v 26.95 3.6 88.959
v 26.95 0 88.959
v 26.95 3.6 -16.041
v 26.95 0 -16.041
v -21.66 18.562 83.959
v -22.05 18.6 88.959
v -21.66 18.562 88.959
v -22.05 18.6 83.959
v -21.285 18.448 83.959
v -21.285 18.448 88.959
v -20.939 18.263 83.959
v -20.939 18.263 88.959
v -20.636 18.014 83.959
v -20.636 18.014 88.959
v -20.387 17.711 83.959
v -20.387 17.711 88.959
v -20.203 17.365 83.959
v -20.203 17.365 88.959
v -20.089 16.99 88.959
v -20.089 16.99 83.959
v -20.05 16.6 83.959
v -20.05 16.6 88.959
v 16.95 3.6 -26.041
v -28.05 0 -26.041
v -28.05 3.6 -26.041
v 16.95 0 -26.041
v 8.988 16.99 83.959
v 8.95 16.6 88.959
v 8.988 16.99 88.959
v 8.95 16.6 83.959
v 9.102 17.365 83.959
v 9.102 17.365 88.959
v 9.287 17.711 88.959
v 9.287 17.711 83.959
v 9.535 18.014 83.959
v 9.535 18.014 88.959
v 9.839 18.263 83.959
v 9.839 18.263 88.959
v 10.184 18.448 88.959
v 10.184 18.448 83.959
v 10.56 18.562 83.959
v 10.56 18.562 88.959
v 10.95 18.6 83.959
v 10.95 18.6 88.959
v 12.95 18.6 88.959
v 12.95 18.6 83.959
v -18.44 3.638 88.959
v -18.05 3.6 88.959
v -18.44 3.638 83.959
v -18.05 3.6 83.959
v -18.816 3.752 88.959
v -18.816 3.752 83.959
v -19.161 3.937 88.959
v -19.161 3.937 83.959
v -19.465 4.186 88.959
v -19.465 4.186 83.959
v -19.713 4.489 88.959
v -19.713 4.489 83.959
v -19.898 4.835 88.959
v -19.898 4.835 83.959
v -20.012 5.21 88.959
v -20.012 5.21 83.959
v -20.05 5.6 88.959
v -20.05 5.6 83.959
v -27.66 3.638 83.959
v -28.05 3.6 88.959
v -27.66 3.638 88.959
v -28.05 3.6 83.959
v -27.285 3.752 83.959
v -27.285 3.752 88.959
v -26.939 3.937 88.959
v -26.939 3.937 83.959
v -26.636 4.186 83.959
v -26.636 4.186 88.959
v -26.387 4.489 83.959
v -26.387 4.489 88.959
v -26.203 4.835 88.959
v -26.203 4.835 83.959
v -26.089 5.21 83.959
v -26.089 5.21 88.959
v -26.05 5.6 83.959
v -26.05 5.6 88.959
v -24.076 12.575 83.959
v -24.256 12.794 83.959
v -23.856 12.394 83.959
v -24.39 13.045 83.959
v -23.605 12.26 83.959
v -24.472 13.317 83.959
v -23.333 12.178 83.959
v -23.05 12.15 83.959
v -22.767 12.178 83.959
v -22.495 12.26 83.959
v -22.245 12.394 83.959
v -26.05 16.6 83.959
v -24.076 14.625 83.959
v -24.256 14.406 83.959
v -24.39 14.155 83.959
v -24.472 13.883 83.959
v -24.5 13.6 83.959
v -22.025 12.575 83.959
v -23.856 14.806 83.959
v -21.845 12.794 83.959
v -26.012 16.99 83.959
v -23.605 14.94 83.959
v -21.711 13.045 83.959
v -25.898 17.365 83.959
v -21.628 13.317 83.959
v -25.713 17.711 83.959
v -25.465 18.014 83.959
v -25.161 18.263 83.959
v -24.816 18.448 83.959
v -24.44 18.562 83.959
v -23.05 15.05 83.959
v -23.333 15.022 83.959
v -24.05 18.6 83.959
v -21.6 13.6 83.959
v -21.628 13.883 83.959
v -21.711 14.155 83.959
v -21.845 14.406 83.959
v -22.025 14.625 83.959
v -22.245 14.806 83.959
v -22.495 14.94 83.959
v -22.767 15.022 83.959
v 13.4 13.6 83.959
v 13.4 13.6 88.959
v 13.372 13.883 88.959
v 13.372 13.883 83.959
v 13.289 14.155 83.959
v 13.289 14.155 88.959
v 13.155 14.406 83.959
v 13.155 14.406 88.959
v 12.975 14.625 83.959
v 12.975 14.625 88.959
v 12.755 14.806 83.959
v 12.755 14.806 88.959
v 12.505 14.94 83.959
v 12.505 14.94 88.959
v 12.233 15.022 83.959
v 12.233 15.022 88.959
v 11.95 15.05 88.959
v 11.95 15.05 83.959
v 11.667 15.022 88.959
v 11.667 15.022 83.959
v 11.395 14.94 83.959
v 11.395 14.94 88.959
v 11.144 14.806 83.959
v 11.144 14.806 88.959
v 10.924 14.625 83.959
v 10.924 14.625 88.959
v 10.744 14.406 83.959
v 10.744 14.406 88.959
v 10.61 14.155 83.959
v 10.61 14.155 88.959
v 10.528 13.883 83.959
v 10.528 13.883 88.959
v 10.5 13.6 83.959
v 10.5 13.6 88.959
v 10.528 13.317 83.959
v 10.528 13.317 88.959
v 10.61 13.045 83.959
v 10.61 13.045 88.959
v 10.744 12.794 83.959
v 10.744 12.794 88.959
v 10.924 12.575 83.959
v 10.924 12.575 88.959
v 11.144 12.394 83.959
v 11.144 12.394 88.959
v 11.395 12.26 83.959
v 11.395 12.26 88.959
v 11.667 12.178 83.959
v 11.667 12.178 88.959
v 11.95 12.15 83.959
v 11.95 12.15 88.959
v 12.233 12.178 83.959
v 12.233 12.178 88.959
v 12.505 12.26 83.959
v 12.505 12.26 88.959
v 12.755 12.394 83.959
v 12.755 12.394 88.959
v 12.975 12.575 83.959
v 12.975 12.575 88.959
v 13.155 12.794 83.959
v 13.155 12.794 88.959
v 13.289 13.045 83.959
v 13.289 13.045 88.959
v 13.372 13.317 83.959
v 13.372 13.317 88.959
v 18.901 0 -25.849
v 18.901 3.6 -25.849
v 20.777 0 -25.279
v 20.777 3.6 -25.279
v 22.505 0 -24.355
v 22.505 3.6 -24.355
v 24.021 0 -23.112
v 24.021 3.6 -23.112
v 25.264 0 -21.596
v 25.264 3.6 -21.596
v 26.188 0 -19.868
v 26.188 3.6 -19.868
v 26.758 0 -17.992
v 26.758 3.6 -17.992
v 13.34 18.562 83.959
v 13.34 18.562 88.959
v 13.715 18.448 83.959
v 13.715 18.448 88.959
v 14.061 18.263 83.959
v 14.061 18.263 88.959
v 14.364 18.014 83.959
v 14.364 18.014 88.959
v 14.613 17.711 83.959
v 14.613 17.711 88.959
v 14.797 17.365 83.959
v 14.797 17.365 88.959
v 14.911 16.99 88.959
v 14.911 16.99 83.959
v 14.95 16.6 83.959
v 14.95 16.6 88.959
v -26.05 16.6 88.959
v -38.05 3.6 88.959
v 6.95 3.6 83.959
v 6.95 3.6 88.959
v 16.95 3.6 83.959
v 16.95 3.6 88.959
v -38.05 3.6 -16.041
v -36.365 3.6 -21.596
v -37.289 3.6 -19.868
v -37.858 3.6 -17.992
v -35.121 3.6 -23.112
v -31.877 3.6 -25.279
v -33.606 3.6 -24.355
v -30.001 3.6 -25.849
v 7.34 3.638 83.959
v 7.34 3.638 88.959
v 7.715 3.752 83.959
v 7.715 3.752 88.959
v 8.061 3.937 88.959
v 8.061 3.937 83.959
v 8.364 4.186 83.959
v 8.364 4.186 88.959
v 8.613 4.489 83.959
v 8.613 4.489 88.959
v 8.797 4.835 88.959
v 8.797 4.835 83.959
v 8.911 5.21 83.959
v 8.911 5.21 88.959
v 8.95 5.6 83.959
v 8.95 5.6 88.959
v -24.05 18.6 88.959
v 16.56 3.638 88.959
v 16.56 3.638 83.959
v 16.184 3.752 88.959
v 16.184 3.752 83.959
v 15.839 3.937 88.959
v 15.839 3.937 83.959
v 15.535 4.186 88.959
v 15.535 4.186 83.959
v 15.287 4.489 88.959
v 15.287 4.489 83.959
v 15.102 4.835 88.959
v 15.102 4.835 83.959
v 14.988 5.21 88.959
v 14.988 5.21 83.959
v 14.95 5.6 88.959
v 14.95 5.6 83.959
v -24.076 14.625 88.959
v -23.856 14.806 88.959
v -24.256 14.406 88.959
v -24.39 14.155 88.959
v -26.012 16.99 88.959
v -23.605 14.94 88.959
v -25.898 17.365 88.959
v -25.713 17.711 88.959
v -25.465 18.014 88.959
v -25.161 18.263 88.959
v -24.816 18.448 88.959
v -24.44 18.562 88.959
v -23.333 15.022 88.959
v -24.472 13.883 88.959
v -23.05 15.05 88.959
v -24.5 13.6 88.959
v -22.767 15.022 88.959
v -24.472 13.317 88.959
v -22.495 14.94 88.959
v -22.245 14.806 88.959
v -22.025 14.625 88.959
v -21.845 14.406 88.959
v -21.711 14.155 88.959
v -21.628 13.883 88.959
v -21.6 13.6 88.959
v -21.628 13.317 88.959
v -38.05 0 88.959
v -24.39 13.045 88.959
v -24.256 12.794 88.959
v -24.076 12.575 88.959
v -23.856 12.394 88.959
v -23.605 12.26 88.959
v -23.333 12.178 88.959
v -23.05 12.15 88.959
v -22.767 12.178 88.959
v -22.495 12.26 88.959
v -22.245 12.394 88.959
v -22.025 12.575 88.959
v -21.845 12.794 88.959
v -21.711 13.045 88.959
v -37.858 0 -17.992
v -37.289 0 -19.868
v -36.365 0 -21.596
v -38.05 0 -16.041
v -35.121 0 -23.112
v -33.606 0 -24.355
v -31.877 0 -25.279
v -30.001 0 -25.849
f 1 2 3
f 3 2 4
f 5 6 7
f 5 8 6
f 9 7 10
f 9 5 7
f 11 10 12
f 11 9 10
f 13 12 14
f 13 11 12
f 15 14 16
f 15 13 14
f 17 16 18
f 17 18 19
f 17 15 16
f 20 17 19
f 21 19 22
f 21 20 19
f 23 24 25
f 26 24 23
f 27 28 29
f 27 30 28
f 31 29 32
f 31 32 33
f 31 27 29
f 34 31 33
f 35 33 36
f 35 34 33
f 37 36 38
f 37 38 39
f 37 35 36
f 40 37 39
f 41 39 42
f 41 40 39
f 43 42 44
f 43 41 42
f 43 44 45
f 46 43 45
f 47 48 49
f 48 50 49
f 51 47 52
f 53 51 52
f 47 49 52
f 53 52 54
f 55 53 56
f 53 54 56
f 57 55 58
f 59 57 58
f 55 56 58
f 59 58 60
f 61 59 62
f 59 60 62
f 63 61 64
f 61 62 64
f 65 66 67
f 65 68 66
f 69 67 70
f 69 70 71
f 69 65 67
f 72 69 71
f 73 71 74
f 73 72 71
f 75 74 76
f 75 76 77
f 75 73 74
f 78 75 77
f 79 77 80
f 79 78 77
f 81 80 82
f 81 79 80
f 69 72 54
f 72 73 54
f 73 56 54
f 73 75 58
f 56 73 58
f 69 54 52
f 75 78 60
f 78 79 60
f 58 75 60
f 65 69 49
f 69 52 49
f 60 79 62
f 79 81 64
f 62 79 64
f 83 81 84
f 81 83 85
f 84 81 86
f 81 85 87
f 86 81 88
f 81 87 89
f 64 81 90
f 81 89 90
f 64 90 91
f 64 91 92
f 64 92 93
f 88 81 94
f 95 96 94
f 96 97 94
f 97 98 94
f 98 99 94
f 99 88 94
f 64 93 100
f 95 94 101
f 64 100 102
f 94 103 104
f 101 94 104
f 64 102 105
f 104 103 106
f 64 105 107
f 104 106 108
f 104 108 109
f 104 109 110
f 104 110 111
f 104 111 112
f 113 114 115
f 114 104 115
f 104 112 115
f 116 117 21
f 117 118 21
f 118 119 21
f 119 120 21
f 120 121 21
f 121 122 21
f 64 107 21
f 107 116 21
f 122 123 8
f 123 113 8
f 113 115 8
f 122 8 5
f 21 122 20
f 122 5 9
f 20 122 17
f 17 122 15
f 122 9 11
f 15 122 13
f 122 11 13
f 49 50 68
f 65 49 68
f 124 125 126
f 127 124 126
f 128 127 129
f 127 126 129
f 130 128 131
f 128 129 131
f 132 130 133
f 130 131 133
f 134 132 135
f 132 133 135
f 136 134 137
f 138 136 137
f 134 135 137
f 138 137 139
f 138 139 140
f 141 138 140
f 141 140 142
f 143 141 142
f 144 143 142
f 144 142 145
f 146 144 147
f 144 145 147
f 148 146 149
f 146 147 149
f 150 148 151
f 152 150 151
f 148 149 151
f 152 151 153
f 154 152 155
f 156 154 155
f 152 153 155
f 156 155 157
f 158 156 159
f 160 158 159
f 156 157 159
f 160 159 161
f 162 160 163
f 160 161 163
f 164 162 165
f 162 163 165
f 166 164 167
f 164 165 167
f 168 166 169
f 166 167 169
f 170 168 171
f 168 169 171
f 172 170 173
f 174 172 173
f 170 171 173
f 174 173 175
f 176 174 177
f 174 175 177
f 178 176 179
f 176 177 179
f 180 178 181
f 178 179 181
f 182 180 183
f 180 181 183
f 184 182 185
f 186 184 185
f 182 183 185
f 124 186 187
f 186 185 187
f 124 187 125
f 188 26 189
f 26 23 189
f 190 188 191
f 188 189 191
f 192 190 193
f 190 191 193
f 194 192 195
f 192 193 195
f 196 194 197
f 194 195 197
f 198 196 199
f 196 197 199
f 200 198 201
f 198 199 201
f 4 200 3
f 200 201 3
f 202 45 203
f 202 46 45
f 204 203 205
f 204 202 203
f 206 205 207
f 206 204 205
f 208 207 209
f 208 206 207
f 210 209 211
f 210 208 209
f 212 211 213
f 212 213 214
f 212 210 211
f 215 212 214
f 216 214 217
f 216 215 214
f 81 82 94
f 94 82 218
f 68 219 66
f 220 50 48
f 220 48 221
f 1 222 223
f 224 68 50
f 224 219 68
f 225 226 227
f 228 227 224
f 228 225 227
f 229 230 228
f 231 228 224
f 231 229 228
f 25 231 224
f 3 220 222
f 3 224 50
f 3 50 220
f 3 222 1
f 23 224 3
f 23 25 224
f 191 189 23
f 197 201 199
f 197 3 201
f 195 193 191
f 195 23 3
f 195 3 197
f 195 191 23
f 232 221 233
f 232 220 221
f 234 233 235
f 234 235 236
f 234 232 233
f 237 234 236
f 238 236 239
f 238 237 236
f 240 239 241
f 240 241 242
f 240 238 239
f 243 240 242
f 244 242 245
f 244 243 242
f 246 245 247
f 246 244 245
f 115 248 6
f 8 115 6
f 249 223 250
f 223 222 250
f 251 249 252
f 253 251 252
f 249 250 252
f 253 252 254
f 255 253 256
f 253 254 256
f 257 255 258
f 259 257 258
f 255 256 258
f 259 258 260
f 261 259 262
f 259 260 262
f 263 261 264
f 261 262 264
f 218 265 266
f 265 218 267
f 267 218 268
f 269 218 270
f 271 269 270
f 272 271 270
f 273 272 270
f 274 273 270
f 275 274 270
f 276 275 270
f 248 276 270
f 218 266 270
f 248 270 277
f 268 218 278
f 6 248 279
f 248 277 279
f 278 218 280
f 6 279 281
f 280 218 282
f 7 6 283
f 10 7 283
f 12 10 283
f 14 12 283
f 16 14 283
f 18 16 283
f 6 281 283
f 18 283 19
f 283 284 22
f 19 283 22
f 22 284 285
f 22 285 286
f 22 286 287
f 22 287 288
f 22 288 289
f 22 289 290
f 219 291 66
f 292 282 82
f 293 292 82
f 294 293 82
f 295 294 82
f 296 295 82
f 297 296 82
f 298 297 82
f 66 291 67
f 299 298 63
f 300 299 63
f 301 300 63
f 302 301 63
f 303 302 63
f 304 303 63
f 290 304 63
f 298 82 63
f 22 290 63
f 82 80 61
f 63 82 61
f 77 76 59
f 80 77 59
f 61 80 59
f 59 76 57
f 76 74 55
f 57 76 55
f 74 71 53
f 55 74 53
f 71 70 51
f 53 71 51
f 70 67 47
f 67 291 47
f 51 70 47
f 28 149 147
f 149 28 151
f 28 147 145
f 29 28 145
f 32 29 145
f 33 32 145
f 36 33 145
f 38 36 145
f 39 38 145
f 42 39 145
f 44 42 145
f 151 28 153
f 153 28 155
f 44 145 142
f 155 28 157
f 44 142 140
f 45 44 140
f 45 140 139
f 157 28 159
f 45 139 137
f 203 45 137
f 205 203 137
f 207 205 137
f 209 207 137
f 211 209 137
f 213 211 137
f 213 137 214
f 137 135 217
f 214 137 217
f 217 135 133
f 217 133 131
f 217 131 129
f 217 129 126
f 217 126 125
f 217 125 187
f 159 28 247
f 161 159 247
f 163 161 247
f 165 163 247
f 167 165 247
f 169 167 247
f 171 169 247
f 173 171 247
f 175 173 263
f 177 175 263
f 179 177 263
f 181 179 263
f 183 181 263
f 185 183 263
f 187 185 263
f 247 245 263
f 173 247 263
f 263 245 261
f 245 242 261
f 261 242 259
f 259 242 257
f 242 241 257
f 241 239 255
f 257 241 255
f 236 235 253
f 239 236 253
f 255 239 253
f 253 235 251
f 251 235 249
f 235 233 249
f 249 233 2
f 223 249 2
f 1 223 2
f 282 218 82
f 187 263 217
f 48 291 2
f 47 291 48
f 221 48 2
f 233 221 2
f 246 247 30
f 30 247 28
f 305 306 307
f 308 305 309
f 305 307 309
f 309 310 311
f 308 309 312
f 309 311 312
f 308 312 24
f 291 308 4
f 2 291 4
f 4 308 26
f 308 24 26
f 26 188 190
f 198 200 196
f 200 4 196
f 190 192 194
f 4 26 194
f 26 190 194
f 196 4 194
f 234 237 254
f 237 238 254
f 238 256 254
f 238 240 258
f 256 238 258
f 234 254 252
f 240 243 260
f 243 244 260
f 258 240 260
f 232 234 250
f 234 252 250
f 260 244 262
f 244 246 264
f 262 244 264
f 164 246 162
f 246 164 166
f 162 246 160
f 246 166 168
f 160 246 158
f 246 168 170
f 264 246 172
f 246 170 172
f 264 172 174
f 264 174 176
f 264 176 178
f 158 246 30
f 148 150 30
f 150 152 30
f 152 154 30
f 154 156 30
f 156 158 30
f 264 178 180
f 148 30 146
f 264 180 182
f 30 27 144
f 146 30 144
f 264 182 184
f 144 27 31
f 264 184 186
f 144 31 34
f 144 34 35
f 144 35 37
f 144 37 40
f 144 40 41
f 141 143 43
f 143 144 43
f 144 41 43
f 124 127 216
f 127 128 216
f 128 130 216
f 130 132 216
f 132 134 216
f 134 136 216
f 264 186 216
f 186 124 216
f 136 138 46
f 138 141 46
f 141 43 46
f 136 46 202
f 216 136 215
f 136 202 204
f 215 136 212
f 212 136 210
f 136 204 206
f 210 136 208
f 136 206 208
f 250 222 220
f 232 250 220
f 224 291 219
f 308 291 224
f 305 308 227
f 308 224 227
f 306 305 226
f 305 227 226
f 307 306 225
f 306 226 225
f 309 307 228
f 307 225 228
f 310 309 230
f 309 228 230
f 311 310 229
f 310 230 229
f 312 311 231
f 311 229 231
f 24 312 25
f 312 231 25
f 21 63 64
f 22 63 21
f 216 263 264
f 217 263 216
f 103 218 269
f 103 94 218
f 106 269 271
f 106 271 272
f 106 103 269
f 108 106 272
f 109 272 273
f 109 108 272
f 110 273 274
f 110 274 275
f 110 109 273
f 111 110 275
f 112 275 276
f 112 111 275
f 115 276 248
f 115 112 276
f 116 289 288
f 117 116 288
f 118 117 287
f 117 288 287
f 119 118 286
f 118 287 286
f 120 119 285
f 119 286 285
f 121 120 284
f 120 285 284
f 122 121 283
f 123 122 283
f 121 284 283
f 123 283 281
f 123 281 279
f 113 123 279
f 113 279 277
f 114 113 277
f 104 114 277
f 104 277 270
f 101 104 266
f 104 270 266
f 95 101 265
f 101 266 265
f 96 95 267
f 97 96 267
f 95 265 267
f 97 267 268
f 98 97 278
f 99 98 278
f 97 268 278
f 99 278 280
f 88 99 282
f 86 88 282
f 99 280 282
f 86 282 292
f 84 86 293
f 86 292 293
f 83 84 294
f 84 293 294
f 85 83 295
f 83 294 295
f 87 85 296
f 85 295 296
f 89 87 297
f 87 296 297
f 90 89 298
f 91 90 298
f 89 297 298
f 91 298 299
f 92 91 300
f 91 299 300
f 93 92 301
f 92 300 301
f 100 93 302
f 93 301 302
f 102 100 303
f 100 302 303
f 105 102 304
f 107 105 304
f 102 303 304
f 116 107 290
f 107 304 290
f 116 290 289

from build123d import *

# Parameters (mm, degrees)
SKETCH_1_W      = 65
SKETCH_1_H      = 115
EXTRUDE_1_DEPTH = 3.6
SKETCH_3_W      = 6
SKETCH_3_H      = 15
SKETCH_3_R      = 1.45
EXTRUDE_2_DEPTH = 5
FILLET_1_R      = 10
FILLET_2_R      = 2


with BuildPart() as part:
    # 草图1 → 凸台-拉伸1 (new body)
    with BuildSketch(Plane(origin=(0, 0, 0), x_dir=(1, 0, 0), z_dir=(0, 1, 0))):
        with Locations((-5.550310529, -31.459318732)):
            Rectangle(SKETCH_1_W, SKETCH_1_H)
    extrude(amount=EXTRUDE_1_DEPTH)

    # 草图3 → 凸台-拉伸2 (add)
    with BuildSketch(Plane.XY.offset(88.959318732)):
        with Locations((-23.050310529, 11.1)):
            Rectangle(SKETCH_3_W, SKETCH_3_H)
        with Locations((-23.050310529, 13.6)):
            Circle(SKETCH_3_R, mode=Mode.SUBTRACT)
        with Locations((11.949689471, 11.1)):
            Rectangle(SKETCH_3_W, SKETCH_3_H)
        with Locations((11.949689471, 13.6)):
            Circle(SKETCH_3_R, mode=Mode.SUBTRACT)
    extrude(amount=-EXTRUDE_2_DEPTH)

    # 圆角1
    fillet_1_edges = [part.edges().sort_by_distance(p)[0] for p in [
        (-38.050310529, 1.8, -26.040681268),
        (26.949689471, 1.8, -26.040681268),
    ]]
    fillet(fillet_1_edges, radius=FILLET_1_R)

    # 圆角2
    fillet_2_edges = [part.edges().sort_by_distance(p)[0] for p in [
        (-26.050310529, 3.6, 86.459318732),
        (-26.050310529, 18.6, 86.459318732),
        (-20.050310529, 18.6, 86.459318732),
        (-20.050310529, 3.6, 86.459318732),
        (14.949689471, 18.6, 86.459318732),
        (14.949689471, 3.6, 86.459318732),
        (8.949689471, 3.6, 86.459318732),
        (8.949689471, 18.6, 86.459318732),
    ]]
    fillet(fillet_2_edges, radius=FILLET_2_R)


solid = part.part
